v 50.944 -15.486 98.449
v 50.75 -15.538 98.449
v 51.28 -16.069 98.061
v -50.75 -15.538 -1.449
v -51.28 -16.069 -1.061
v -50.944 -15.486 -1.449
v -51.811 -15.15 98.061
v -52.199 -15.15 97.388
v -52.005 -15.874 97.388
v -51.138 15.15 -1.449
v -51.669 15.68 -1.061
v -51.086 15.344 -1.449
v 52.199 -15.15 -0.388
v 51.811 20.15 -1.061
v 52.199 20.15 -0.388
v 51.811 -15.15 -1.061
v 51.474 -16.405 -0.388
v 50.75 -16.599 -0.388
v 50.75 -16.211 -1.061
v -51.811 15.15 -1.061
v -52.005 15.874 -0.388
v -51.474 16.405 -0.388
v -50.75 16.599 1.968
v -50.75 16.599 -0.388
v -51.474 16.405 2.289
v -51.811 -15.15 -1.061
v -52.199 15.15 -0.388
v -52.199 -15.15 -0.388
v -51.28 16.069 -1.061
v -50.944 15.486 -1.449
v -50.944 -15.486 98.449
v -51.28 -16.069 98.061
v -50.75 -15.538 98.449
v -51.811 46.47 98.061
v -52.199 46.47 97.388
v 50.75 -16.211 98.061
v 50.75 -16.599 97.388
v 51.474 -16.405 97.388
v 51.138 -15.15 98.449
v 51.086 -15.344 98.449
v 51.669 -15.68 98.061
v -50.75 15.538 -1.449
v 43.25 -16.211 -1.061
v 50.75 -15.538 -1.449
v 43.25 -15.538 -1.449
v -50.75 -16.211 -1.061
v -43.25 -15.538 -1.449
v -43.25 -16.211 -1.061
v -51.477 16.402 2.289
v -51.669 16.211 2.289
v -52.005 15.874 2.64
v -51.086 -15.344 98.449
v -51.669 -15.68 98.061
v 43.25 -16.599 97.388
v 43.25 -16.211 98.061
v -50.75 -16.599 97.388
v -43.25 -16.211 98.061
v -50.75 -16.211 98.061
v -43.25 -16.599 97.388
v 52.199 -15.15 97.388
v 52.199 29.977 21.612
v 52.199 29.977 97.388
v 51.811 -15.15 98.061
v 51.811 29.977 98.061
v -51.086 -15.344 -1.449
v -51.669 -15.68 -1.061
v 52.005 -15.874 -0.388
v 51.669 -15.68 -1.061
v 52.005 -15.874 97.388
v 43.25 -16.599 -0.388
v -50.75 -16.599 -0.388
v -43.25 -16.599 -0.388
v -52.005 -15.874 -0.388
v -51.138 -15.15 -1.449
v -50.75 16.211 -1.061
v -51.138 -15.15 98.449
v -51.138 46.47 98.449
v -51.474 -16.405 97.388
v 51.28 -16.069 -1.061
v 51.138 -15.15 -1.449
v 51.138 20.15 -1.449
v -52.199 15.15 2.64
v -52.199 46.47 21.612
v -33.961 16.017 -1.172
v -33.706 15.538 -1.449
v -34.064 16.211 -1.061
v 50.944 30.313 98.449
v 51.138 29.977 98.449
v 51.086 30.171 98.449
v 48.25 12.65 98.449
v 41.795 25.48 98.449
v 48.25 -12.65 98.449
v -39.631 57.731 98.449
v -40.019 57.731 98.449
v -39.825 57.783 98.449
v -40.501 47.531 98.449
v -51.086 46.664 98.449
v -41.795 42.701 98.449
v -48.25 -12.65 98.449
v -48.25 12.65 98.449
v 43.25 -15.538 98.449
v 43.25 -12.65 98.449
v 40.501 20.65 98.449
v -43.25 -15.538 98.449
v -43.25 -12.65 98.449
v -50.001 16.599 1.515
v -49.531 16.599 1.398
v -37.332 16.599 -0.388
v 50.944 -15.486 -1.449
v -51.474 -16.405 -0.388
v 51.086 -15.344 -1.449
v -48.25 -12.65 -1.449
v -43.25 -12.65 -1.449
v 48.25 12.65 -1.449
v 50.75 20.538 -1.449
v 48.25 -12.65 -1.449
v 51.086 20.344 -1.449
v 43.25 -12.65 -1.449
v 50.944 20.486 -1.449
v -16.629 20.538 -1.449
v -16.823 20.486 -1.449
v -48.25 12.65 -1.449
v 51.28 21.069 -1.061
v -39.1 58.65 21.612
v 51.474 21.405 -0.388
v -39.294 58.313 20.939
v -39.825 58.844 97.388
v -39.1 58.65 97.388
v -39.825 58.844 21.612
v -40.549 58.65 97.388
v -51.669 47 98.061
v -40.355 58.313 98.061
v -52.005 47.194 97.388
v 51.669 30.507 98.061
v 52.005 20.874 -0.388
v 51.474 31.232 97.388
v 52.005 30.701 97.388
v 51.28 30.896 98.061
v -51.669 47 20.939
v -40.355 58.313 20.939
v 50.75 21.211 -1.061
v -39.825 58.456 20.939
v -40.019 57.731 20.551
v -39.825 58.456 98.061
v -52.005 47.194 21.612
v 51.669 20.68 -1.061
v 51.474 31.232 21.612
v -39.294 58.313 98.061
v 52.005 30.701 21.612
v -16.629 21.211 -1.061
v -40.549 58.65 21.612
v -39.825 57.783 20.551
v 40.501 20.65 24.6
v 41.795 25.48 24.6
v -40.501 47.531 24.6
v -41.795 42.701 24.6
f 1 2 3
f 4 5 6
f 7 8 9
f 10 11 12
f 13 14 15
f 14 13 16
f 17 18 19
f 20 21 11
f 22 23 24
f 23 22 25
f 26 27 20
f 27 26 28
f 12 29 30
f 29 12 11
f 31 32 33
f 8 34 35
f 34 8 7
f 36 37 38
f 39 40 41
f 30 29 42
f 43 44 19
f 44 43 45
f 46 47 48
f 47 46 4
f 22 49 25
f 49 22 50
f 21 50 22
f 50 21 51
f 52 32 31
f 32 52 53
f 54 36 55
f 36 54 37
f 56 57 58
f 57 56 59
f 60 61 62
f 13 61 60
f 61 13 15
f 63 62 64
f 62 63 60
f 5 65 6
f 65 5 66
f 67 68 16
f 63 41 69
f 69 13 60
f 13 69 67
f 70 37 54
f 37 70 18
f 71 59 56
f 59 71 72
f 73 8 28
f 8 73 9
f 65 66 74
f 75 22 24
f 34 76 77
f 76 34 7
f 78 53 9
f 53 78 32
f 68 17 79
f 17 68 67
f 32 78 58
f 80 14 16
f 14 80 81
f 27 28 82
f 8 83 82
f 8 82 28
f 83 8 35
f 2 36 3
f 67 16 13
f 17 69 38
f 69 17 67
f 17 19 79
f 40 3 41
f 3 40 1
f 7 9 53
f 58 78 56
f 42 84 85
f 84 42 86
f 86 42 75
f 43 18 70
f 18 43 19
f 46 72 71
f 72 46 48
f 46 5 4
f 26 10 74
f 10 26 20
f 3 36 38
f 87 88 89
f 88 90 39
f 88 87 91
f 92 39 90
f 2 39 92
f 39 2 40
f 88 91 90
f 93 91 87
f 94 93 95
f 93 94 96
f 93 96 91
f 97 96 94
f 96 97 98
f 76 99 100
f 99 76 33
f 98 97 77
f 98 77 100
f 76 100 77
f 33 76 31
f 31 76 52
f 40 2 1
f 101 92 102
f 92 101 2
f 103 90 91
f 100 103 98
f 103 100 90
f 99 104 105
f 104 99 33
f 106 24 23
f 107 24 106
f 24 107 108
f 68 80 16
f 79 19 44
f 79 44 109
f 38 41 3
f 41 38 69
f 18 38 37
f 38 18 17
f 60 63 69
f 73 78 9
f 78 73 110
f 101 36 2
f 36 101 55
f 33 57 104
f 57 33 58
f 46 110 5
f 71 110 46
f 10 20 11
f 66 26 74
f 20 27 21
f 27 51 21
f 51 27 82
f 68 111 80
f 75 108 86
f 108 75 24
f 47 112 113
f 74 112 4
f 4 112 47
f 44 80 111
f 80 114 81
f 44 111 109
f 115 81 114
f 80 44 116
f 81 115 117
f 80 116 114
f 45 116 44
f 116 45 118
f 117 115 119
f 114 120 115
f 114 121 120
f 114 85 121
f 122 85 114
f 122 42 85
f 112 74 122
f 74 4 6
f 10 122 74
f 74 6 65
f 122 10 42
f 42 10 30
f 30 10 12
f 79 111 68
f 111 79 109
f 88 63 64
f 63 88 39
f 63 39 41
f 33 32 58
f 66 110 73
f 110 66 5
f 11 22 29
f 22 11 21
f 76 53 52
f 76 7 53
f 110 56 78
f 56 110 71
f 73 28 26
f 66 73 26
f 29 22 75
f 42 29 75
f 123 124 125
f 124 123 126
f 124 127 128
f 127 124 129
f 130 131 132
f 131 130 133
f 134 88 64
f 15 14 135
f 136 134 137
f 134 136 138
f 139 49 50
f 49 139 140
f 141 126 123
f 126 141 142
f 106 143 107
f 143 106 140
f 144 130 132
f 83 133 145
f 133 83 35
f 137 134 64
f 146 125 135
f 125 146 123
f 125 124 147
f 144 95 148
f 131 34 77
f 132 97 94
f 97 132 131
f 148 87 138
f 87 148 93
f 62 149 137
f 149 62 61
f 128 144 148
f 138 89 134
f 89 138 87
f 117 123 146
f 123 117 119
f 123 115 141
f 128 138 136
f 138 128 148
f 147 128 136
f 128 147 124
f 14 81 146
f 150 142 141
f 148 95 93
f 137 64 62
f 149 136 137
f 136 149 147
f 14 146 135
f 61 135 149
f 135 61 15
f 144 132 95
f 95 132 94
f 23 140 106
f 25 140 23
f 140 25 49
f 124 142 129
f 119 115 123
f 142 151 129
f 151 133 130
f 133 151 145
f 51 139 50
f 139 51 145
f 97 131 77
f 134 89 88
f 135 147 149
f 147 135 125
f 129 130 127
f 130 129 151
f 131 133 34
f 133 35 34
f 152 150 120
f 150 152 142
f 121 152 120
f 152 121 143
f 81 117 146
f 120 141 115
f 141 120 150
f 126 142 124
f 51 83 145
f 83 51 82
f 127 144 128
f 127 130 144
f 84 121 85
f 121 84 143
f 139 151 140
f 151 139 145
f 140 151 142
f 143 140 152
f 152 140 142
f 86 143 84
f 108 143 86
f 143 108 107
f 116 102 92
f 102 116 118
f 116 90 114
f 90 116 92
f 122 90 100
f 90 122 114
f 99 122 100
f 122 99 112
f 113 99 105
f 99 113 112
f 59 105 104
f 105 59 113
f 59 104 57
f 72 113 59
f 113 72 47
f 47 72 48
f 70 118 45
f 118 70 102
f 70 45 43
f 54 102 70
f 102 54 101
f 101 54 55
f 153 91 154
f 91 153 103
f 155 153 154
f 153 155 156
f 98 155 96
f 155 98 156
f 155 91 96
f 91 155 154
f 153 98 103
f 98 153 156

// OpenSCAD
// Split Keyboard Armrest Mount - Slide-on insert with palm rest and mount cavity
// -------------------------------------------------

/* [Armrest Dimensions] */
arm_width = 96.0;
arm_thickness = 24.8;
lip_width = 5.0;       // Grip under the armrest
fit_tolerance = 0.5;   // Extra gap for sliding fit

/* [Ergonomics] */
tenting_angle = 15;      // 15 degrees tilt (Left/Right)
is_right_armrest = true; // TRUE = Right Arm

/* [Mount Configuration] */
wall_thickness = 4;     // Solid walls
mount_length = 100;     // Total length
top_wall_min = 6.0;     // Roof thickness
bottom_wall_slot = 4.0; // Floor thickness below slot

/* [Comfort & Aesthetics] */
rounding_r = 1.5;       // 1.5mm global rounding radius
back_edge_round_r = 5.0; // Roundover for the very back edge
taper_back_chamfer = 35.0; // Aggressive taper at the back (35mm)
taper_front_chamfer = 12.0; // Increased taper at the front (12mm) - Reduces bulk

/* [Ugreen MagSafe Cavity] */
magsafe_slot_width = 85.2;
magsafe_slot_thickness = 5.0;
magsafe_slot_depth = 75.0;

/* [Preview] */
preview_context = true;
$fn = 60;

// -------------------------------------------------

// Calculate Geometry
rotation_val = is_right_armrest ? -tenting_angle : tenting_angle;
block_width = arm_width + 2*wall_thickness + fit_tolerance;

// Slot Geometry
slot_half_w = magsafe_slot_width / 2;
slot_half_t = magsafe_slot_thickness / 2;
slot_bbox_h = (magsafe_slot_width * abs(sin(rotation_val))) + (magsafe_slot_thickness * abs(cos(rotation_val)));
center_h = bottom_wall_slot + slot_bbox_h/2 + top_wall_min;

// Wedge Heights (Front/Slot Section)
// We calculate the full trapezoid heights first
rise = (block_width/2) * tan(abs(rotation_val));
h_high = center_h + rise + 5;
h_low  = center_h - rise + 5;
h_left_safe  = is_right_armrest ? h_high : h_low;
h_right_safe = is_right_armrest ? h_low : h_high;

// Taper Geometry (Back Section)
// Low profile at the back
h_taper_base = 5; // Lowered to 5mm for minimal profile
h_left_taper = h_taper_base;
h_right_taper = h_taper_base;

// Taper/Chamfer Direction
// Right Arm -> Left is High/Inside -> Chamfer Left Corner
chamfer_left = is_right_armrest;
chamfer_right = !is_right_armrest;

// -------------------------------------------------
// MAIN ASSEMBLY
// -------------------------------------------------

difference() {
  // 1. POSITIVE BODY (Minkowski Rounded)
  minkowski() {
    union() {
      // A. Clamp Base Solid
      linear_extrude(height = mount_length - 2*rounding_r)
        translate([0,0])
        clamp_outer_profile(rounding_r);

      // B. Integrated Tapered Wedge
      // Uses hull() to smoothly transition profiles. No cuts.
      translate([0, arm_thickness/2 + wall_thickness + fit_tolerance/2, 0])
        constructive_wedge_solid(block_width, rounding_r);
    }
    // The Rounding Tool
    sphere(r=rounding_r, $fn=12);
  }

  // 2. NEGATIVE CUTS

  // A. The Armrest Channel
  translate([0, 0, -5])
    linear_extrude(height = mount_length + 20)
      clamp_inner_cut_profile();

  // B. The MagSafe Slot
  translate([0, arm_thickness/2 + wall_thickness + fit_tolerance/2 + bottom_wall_slot + (slot_bbox_h/2), mount_length - magsafe_slot_depth/2 + 0.1])
    rotate([0, 0, rotation_val])
    cube([magsafe_slot_width, magsafe_slot_thickness, magsafe_slot_depth + 1], center=true);

  // C. Front Opening Cleanup
  translate([0, arm_thickness/2 + wall_thickness + fit_tolerance/2 + bottom_wall_slot + (slot_bbox_h/2), mount_length + 5])
    rotate([0, 0, rotation_val])
    cube([magsafe_slot_width, magsafe_slot_thickness, 20], center=true);

  // D. "Waterfall" Back Edge Roundover (Z=0)
  // Rounds the entry point for the arm
  translate([0, arm_thickness*2, 0])
    rotate([0, 90, 0])
    translate([0, 0, -block_width])
      cylinder(r=back_edge_round_r, h=block_width*2);

  // E. Top-Back Smooth Roundover
  // Rounds the top edge of the taper
  translate([0, arm_thickness + wall_thickness*2 + h_taper_base + back_edge_round_r, 0])
    rotate([0, 90, 0])
    cylinder(r=back_edge_round_r, h=block_width*2, center=true);
}


// -------------------------------------------------
// MODULES
// -------------------------------------------------

module constructive_wedge_solid(w, r) {
  taper_len = mount_length - magsafe_slot_depth; // e.g. 25mm

  // Section 1: The Transition (Back -> Slot Start)
  hull() {
    // Z=0: Back Profile (Low + Large Chamfer)
    translate([0,0,0])
      linear_extrude(0.1)
      wedge_chamfered_profile(w, h_left_taper, h_right_taper, r, taper_back_chamfer);

    // Z=25: Slot Start Profile (High + Small Chamfer)
    translate([0,0, taper_len - 2*r])
      linear_extrude(0.1)
      wedge_chamfered_profile(w, h_left_safe, h_right_safe, r, taper_front_chamfer);
  }

  // Section 2: The Main Slot Body (Slot Start -> Front)
  // Continuous extrusion of the "Slot Start" profile
  translate([0,0, taper_len - 2*r])
    linear_extrude(height = magsafe_slot_depth)
    wedge_chamfered_profile(w, h_left_safe, h_right_safe, r, taper_front_chamfer);
}

// Custom Profile that clips the "Inside" corner
module wedge_chamfered_profile(w, h_l, h_r, r, chamfer_sz) {
  offset(r = -r)
  polygon(points=[
    // Bottom Base (Extended -5mm for fusion)
    [-w/2, -5],
    [w/2, -5],

    // Right Side
    // If chamfer_right is true, we clip the Top-Right corner
    chamfer_right ? [w/2, h_r - chamfer_sz] : [w/2, h_r],
    chamfer_right ? [w/2 - chamfer_sz, h_r] : [w/2, h_r], // Duplicate if no chamfer (harmless)

    // Left Side
    // If chamfer_left is true, we clip the Top-Left corner
    chamfer_left ? [-w/2 + chamfer_sz, h_l] : [-w/2, h_l],
    chamfer_left ? [-w/2, h_l - chamfer_sz] : [-w/2, h_l]
  ]);
}

module clamp_outer_profile(r) {
  w_outer = arm_width + (wall_thickness * 2) + fit_tolerance - 2*r;
  h_outer = arm_thickness + (wall_thickness * 2) + fit_tolerance - 2*r;
  translate([-w_outer/2, -h_outer/2])
    square([w_outer, h_outer]);
}

module clamp_inner_cut_profile() {
  w_outer = arm_width + (wall_thickness * 2) + fit_tolerance;
  h_outer = arm_thickness + (wall_thickness * 2) + fit_tolerance;
  w_inner = arm_width + fit_tolerance;
  h_inner = arm_thickness + fit_tolerance;

  translate([-w_inner/2, -h_inner/2])
    square([w_inner, h_inner]);

  gap_width = w_inner - (2 * lip_width);
  cut_height = wall_thickness + 10;

  translate([-gap_width/2, -h_outer/2 - 5])
    square([gap_width, cut_height]);
}

// -------------------------------------------------
// PREVIEW
// -------------------------------------------------
if (preview_context) {
  %color("Silver", 0.4)
  translate([-(arm_width)/2, -(arm_thickness)/2, -10])
    cube([arm_width, arm_thickness, mount_length + 20]);

  %color("FireBrick", 0.8)
  translate([0, arm_thickness/2 + wall_thickness + fit_tolerance/2 + bottom_wall_slot + (slot_bbox_h/2), mount_length - magsafe_slot_depth/2])
    rotate([0, 0, rotation_val])
    cube([magsafe_slot_width, magsafe_slot_thickness, magsafe_slot_depth + 20], center=true);
}
